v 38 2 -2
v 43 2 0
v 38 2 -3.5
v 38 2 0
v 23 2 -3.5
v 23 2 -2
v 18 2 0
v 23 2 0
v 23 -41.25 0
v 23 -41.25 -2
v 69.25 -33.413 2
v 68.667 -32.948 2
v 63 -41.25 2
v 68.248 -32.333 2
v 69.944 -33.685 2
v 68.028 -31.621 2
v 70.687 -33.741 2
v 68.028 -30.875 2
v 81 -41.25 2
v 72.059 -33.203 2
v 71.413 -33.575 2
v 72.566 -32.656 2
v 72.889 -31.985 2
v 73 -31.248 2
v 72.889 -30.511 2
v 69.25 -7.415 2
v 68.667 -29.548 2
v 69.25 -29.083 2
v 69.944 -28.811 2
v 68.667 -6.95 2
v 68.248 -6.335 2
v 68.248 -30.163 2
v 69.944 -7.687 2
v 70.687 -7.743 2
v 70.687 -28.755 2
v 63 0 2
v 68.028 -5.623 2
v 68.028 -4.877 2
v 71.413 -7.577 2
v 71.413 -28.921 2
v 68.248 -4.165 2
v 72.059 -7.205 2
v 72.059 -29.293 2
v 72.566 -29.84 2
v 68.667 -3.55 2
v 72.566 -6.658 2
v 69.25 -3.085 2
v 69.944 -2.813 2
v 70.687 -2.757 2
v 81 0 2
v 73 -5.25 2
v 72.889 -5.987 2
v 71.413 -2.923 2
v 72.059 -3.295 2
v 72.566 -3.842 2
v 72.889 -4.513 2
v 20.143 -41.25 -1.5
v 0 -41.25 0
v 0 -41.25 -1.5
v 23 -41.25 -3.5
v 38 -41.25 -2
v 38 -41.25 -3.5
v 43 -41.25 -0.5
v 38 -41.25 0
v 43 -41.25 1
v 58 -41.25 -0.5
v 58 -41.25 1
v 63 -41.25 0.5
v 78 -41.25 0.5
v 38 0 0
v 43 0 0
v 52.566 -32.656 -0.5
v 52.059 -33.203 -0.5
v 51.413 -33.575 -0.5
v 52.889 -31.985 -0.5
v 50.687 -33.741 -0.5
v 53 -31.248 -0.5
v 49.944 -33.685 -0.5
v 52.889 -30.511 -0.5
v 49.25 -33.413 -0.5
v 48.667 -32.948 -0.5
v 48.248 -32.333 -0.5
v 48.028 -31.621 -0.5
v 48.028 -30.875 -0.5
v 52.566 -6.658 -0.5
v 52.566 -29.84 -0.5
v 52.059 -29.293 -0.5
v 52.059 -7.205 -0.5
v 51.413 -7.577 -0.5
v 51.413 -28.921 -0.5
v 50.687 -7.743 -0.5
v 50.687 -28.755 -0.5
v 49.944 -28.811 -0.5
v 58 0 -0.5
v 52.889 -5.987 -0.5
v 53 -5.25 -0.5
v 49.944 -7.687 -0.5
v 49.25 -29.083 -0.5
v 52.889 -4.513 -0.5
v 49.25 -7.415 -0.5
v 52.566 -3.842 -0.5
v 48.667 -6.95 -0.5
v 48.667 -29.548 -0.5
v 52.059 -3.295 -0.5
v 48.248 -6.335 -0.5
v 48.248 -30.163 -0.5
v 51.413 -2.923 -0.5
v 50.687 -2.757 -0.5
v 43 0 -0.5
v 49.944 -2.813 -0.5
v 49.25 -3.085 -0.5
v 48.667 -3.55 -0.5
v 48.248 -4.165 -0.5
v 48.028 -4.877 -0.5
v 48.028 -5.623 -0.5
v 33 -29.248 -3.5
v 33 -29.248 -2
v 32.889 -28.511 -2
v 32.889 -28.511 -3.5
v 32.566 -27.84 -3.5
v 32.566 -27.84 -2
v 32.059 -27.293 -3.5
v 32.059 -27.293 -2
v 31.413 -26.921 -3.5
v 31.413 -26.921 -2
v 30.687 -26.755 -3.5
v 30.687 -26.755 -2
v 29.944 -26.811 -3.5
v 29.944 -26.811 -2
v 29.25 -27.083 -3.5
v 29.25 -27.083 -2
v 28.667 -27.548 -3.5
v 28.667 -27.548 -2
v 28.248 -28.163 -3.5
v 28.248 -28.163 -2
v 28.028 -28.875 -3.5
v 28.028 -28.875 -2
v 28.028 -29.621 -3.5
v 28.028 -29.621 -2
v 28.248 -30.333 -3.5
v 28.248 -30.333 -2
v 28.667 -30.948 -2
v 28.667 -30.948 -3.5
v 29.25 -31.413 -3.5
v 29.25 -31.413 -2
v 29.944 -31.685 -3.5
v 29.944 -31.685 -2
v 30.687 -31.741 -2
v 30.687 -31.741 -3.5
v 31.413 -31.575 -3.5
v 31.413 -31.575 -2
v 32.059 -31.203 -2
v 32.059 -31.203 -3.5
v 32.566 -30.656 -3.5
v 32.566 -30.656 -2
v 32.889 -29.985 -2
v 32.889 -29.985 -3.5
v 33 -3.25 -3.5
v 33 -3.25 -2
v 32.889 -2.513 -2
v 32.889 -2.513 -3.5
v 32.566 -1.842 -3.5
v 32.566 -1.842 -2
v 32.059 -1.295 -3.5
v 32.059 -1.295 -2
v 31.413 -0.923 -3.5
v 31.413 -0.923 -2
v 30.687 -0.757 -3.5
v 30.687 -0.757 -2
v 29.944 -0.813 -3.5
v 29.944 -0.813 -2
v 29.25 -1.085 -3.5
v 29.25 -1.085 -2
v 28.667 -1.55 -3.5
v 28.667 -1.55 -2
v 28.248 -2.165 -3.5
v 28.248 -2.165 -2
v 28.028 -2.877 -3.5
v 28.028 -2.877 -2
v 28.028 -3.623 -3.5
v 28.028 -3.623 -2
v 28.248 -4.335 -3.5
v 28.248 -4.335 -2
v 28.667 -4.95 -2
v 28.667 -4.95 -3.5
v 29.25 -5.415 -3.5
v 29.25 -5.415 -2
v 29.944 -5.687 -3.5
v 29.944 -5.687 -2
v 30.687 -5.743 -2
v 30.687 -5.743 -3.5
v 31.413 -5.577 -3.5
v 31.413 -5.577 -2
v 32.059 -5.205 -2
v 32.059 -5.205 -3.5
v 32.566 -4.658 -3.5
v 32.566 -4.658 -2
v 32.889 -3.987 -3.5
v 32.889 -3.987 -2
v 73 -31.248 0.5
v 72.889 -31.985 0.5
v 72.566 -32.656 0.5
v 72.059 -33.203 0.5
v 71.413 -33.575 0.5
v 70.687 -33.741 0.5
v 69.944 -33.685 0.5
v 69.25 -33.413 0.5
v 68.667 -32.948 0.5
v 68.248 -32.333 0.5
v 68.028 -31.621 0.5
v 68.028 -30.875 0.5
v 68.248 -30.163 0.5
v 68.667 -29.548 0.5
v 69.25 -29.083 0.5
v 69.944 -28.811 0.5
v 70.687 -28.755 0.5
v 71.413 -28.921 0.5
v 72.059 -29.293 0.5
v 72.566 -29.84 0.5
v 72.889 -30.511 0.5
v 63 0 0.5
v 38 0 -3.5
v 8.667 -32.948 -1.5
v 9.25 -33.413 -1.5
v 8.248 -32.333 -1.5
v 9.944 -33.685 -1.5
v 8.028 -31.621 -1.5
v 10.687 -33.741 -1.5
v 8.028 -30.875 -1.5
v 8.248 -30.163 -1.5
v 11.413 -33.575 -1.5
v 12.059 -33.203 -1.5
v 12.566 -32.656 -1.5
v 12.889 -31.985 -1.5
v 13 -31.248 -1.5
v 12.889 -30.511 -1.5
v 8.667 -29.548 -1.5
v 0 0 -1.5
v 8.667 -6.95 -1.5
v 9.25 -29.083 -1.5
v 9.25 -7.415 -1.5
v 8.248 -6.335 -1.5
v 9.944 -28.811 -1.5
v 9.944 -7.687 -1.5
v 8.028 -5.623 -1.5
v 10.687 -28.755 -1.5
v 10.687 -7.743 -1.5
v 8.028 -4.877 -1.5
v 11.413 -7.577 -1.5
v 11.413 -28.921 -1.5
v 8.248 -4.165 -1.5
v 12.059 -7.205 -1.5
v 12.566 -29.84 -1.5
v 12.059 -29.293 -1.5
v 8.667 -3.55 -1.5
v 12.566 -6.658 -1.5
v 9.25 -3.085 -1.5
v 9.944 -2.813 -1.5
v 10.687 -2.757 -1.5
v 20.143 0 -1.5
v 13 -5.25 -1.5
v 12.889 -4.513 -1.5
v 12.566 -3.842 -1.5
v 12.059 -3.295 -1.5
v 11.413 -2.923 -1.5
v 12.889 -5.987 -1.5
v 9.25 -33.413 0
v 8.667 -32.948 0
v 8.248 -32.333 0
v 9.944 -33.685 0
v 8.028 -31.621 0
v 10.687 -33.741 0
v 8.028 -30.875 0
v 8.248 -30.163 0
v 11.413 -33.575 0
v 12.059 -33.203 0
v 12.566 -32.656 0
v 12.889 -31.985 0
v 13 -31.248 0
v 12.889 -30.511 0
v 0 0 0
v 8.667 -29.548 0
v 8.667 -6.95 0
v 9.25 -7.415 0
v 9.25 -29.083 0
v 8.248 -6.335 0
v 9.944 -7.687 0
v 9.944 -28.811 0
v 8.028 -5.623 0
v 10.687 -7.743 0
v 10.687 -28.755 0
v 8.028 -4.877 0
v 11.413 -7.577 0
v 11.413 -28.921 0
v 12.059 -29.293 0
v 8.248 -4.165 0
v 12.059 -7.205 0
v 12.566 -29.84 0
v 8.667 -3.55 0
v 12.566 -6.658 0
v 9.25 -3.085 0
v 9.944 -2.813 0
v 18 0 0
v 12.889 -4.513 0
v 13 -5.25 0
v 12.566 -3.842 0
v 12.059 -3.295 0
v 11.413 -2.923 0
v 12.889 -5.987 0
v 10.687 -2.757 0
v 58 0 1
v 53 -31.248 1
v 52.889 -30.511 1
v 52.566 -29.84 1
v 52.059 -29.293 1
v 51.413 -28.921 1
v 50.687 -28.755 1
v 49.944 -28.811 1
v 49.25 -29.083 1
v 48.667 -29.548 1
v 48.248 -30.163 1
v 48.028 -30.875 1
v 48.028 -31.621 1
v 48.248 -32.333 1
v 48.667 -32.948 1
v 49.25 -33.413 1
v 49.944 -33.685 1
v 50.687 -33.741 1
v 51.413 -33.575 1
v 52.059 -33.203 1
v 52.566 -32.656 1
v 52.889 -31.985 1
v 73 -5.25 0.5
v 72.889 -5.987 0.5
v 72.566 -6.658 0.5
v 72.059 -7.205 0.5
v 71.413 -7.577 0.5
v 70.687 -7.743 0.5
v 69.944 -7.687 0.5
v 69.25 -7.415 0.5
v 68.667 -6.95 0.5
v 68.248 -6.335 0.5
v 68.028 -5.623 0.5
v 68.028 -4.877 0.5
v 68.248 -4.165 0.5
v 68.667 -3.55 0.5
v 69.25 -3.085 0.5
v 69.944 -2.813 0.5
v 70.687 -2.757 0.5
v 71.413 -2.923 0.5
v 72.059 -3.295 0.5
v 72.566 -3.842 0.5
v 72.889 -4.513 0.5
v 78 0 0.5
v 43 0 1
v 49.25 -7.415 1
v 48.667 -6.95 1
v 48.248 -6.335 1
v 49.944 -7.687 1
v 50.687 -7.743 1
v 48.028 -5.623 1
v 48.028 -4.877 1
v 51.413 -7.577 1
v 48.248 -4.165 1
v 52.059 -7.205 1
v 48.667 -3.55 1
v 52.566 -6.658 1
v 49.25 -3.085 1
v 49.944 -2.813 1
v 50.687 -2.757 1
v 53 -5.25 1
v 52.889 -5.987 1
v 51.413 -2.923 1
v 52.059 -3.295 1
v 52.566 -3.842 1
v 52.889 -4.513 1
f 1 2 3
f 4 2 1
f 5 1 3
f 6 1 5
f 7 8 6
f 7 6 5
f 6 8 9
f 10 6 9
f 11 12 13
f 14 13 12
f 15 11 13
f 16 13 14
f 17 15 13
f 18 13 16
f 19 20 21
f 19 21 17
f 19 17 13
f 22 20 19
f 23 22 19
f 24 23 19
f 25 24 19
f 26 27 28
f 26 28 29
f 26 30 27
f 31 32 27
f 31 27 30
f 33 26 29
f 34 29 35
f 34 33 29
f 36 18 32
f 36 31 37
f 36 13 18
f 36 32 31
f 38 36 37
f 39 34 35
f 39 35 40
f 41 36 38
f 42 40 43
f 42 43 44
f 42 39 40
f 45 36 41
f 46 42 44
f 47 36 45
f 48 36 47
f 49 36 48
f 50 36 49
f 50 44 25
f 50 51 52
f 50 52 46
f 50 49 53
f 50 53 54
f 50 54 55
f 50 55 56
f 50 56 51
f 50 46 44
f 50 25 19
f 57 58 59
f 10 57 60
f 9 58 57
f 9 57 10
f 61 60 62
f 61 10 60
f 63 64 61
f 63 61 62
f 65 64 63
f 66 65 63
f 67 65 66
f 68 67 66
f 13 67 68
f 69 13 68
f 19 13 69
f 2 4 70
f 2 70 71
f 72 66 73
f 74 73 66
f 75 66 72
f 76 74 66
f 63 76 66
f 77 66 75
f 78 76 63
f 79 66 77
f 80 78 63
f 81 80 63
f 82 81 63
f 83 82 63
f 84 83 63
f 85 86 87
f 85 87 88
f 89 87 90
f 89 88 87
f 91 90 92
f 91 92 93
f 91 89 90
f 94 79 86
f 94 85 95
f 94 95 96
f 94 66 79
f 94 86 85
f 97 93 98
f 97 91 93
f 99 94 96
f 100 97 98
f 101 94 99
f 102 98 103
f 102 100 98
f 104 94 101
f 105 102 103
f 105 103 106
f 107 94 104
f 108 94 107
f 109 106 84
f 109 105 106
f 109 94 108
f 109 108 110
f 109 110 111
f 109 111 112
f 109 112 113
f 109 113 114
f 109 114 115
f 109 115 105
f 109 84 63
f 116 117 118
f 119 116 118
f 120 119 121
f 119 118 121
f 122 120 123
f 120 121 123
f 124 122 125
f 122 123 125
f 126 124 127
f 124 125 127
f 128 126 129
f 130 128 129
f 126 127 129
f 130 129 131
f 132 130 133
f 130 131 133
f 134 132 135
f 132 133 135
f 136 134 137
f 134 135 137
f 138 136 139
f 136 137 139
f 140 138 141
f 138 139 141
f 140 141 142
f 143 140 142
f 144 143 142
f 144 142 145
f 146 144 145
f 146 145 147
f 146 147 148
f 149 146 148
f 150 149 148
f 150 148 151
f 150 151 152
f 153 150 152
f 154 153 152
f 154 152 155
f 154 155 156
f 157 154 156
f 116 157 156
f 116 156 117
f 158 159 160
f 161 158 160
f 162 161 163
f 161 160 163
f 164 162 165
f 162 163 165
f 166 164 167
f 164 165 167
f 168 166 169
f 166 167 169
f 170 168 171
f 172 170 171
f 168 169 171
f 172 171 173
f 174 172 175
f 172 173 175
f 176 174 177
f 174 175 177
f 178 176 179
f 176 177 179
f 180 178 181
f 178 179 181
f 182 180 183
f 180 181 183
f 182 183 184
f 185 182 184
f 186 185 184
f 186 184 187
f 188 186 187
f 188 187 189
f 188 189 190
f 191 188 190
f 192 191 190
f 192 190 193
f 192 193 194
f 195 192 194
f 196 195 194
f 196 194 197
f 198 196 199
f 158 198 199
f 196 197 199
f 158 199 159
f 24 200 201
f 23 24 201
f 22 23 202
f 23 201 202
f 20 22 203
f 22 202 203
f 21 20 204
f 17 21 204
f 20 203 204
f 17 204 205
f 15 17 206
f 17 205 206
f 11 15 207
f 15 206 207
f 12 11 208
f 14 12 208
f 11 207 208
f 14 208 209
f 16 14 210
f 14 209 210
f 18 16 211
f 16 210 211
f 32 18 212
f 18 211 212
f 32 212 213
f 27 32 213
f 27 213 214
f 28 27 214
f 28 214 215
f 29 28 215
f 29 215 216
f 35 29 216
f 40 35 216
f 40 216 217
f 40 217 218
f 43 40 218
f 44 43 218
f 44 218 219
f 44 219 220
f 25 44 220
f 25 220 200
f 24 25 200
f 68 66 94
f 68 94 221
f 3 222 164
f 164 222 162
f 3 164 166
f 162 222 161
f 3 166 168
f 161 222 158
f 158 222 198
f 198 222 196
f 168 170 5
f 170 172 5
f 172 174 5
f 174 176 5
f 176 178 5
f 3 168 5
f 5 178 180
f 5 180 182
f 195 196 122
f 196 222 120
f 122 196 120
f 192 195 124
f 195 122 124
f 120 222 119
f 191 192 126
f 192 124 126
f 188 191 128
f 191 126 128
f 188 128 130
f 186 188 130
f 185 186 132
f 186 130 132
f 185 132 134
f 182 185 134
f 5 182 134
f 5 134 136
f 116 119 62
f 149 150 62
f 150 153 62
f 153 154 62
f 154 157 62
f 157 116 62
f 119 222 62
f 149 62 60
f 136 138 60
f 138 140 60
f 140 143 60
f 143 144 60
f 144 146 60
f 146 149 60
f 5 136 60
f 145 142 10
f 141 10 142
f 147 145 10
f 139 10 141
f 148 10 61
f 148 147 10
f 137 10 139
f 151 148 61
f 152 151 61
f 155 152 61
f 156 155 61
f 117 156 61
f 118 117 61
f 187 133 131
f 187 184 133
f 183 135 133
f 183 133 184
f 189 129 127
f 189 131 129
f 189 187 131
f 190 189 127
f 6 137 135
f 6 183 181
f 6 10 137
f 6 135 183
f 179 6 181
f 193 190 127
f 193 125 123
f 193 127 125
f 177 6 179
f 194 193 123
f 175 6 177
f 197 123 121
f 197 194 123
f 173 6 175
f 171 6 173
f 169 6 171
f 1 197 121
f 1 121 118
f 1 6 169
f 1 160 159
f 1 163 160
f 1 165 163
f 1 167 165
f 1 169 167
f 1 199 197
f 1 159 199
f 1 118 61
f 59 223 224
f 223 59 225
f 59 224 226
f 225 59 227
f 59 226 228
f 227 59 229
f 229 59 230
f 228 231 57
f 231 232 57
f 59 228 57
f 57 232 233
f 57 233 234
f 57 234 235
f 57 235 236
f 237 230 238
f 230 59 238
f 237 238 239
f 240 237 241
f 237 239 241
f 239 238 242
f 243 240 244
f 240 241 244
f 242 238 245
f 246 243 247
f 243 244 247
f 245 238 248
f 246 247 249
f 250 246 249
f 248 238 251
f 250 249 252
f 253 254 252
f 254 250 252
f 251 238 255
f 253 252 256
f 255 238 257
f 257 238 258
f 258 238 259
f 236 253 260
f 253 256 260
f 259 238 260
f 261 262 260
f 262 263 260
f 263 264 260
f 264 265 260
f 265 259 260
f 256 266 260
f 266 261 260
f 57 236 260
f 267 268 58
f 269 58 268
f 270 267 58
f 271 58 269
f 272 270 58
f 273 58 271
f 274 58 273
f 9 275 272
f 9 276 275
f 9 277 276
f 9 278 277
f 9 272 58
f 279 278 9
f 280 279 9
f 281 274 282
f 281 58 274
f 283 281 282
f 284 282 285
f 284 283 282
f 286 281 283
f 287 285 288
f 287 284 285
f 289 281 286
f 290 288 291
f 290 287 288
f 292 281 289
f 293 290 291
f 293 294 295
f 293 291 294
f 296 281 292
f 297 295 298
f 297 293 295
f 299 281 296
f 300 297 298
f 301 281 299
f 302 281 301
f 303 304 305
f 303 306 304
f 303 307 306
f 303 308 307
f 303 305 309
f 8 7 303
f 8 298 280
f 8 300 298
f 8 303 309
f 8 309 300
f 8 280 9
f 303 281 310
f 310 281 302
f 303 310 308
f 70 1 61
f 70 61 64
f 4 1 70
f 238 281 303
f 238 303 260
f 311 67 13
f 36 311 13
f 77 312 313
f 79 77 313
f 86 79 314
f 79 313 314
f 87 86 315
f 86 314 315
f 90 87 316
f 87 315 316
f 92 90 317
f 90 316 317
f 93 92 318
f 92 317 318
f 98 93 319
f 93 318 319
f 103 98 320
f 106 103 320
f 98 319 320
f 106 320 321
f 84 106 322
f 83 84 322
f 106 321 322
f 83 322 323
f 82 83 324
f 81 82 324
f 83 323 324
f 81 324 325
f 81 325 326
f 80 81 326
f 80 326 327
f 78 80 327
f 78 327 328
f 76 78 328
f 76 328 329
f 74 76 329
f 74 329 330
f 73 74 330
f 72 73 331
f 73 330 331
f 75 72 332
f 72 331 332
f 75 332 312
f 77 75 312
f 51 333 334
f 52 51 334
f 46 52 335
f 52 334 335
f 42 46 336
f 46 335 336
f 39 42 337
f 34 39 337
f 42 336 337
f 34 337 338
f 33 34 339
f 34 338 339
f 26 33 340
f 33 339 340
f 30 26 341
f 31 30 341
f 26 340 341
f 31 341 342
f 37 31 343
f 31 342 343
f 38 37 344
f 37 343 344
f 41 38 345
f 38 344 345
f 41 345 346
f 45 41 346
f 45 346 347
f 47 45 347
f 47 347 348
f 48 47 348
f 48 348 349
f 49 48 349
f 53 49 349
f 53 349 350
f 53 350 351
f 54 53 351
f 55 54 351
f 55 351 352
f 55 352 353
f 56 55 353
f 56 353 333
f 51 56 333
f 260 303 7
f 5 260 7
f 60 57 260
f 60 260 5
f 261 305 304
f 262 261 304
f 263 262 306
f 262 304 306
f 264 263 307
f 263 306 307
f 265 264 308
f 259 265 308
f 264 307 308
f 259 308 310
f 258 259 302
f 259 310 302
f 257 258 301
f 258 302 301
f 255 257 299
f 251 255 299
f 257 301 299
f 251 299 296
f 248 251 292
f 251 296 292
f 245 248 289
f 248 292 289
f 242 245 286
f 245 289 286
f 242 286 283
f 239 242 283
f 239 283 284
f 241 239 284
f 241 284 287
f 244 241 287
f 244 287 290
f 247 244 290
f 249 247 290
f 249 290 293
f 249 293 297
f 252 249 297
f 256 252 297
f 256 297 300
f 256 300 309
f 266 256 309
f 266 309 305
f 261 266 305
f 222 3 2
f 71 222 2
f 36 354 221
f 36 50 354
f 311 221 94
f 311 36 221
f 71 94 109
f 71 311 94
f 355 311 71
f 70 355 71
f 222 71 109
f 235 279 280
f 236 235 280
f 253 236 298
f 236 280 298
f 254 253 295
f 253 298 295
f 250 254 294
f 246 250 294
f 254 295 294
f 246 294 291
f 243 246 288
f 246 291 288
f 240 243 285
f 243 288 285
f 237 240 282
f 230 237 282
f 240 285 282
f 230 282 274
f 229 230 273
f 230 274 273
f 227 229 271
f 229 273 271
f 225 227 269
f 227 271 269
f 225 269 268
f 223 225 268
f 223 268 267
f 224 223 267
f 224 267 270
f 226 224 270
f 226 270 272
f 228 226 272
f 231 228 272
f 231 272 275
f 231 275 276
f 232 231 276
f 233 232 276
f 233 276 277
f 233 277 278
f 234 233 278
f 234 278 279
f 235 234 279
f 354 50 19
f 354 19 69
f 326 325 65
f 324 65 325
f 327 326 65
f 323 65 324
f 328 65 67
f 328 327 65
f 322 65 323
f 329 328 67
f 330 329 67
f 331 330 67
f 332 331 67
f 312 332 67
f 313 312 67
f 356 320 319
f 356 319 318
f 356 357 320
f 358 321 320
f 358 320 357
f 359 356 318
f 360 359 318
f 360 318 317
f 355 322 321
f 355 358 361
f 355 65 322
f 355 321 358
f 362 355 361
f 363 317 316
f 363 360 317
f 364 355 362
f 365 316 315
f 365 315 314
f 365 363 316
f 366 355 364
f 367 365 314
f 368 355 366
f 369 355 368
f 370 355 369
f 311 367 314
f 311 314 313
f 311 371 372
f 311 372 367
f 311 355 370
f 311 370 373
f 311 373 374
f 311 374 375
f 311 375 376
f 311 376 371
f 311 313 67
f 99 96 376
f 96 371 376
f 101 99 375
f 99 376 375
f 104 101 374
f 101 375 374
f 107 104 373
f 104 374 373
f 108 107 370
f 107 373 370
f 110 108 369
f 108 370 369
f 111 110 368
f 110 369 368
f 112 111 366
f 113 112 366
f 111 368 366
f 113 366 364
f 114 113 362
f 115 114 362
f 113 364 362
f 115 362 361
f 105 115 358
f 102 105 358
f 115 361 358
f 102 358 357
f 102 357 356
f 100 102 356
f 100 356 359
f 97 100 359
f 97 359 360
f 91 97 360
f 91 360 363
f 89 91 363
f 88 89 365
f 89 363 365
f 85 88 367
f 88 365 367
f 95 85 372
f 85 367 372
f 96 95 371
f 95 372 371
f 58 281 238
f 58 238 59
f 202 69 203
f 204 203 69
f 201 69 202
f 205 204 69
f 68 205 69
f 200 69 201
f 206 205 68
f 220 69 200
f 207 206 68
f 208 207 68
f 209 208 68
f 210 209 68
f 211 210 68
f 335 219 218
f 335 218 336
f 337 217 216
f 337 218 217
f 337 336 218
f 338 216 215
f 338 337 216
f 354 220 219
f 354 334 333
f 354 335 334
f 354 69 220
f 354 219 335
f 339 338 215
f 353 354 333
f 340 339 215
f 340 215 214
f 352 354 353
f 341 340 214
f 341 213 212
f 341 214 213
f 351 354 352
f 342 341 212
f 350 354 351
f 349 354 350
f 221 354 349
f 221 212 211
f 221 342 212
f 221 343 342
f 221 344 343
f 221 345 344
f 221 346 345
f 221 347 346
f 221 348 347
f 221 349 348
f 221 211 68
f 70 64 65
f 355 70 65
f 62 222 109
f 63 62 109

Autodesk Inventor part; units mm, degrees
ref_plane "YZ Plane" through (0, 0, 0) normal (1, 0, 0) x (0, 1, 0)
ref_plane "XZ Plane" through (0, 0, 0) normal (0, 1, 0) x (-1, 0, 0)
ref_plane "XY Plane" through (0, 0, 0) normal (0, 0, 1) x (1, 0, 0)
sketch "Sketch1" plane through (0, 0, 0) normal (0, 0, 1) x (1, 0, 0)
  line L0 (0, 0) -> (81, 0)
  line L1 (0, 0) -> (0, -41.25)
  line L2 (0, -41.25) -> (81, -41.25)
  line L3 (81, -41.25) -> (81, 0)
  line L4 (23, 0) -> (23, 2)
  line L5 (23, 2) -> (38, 2)
  line L6 (38, 2) -> (38, 0)
  line L7 (3, 0) -> (3, -41.25)
  line L8 (18, 0) -> (18, -41.25)
  line L9 (23, 0) -> (23, -41.25)
  line L10 (38, 0) -> (38, -41.25)
  line L11 (43, 0) -> (43, -41.25)
  line L12 (58, 0) -> (58, -41.25)
  line L13 (63, 0) -> (63, -41.25)
  line L14 (78, 0) -> (78, -41.25)
  line L15 (0, 0) -> (3, 0)
  line L16 (3, 0) -> (3, -41.25)
  line L17 (3, -41.25) -> (0, -41.25)
  line L18 (0, -41.25) -> (0, 0)
  line L19 (78, 0) -> (81, 0)
  line L20 (81, 0) -> (81, -41.25)
  line L21 (81, -41.25) -> (78, -41.25)
  line L22 (78, -41.25) -> (78, 0)
  circle A0 centre (10.5, -5.25) radius 2.5
  circle A1 centre (10.5, -31.248) radius 2.5
  circle A2 centre (30.5, -3.25) radius 2.5
  circle A3 centre (30.5, -29.248) radius 2.5
  circle A4 centre (50.5, -5.25) radius 2.5
  circle A5 centre (50.5, -31.248) radius 2.5
  circle A6 centre (70.5, -5.25) radius 2.5
  circle A7 centre (70.5, -31.248) radius 2.5
  point P0 (10.5, -41.25)
  point P1 (50.5, 0)
  point P2 (70.5, 0)
  point P3 (30.5, 0)
  dimension "d0" = 81
  dimension "d2" = 41.25
  dimension "d3" = 2
  dimension "d24" = 5
  dimension "d25" = 5
  dimension "d26" = 5
  dimension "d27" = 5
  dimension "d28" = 5
  dimension "d29" = 5
  dimension "d30" = 5
  dimension "d31" = 5
sketch "Sketch3" plane through (0, 0, 0) normal (0, 1, 0) x (-1, 0, 0)
  line L0 (0, 0) -> (-81, 0) projected
  line L1 (-23, 0) -> (-38, 0) projected
  line L2 (0, 0) -> (-81, 0) projected
  line L3 (-23, 0) -> (-23, -2)
  line L4 (-23, -2) -> (-38, -2)
  line L5 (-38, -2) -> (-38, 0)
  line L6 (-43, 0) -> (-43, 1)
  line L7 (-43, 1) -> (-58, 1)
  line L8 (-58, 1) -> (-58, 0)
  line L9 (-63, 0) -> (-63, 2)
  line L10 (-63, 2) -> (-78, 2)
  line L11 (-78, 2) -> (-78, 0)
  line L12 (-23, -2) -> (-38, -2)
  line L13 (-38, -2) -> (-38, -3.5)
  line L14 (-38, -3.5) -> (-23, -3.5)
  line L15 (-23, -3.5) -> (-23, -2)
  line L16 (-18, 0) -> (-23, -3.5)
  line L17 (-38, -3.5) -> (-43, 0)
  line L18 (-43, 1) -> (-58, 1)
  line L19 (-58, 1) -> (-58, -0.5)
  line L20 (-58, -0.5) -> (-43, -0.5)
  line L21 (-43, -0.5) -> (-43, 1)
  line L22 (-38, 0) -> (-43, 1)
  line L23 (-63, 2) -> (-78, 2)
  line L24 (-78, 2) -> (-78, 0.5)
  line L25 (-78, 0.5) -> (-63, 0.5)
  line L26 (-63, 0.5) -> (-63, 2)
  line L27 (-58, 1) -> (-63, 2)
  line L28 (-58, -0.5) -> (-63, 0.5)
  line L29 (-78, 2) -> (-81, 2)
  line L30 (-81, 2) -> (-78, 0.5)
  line L31 (-43, 1) -> (-38, 0)
  line L32 (-43, 0) -> (-43, 1)
  line L33 (-43, 0) -> (-38, 0)
  line L34 (-38, 0) -> (-43, 1)
  line L35 (-43, 1) -> (-43, 0)
  line L36 (-38, -3.5) -> (-43, -0.5)
  line L37 (-43, -0.5) -> (-58, -0.5)
  line L38 (-58, 1) -> (-58, -0.5)
  line L39 (-58, 1) -> (-43, 1)
  line L40 (-58, -0.5) -> (-58, 1)
  line L41 (-58, 1) -> (-63, 2)
  line L42 (-63, 2) -> (-63, 0.5)
  line L43 (-63, 0.5) -> (-58, -0.5)
  line L44 (-58, -0.5) -> (-60.5, 0)
  line L45 (-58, -0.5) -> (-58, 0)
  line L46 (-58, 0) -> (-60.5, 0)
  line L47 (-60.5, 0) -> (-63, 0.5)
  line L48 (-63, 0.5) -> (-63, 2)
  line L49 (-63, 2) -> (-58, 1)
  line L50 (-58, 1) -> (-58, -0.5)
  point P0 (-3, 0)
  dimension "d4" = 2
  dimension "d5" = 1
  dimension "d6" = 2
  dimension "d7" = 15
  dimension "d8" = 90
  dimension "d11" = 1.5
  dimension "d16" = 15
  dimension "d17" = 1.5
extrude "Extrusion1" add sketch "Sketch1" against normal blind 1.5 contours L0 L7 L2 L1 | L0 L8 L2 L7 | L0 L9 L2 L8 | A0 | A1
extrude "Extrusion2" add sketch "Sketch3" against normal blind 41.25 contours L16 L15 L3 L0 | L14 L13 L4 L15 | L5 L13 L17 L0
extrude "Extrusion3" add sketch "Sketch3" along normal blind 2 contours L16 L15 L3 L0 | L14 L13 L4 L15 | L5 L13 L17 L0
extrude "Extrusion4" add sketch "Sketch3" against normal blind 41.25 contours L0 L6 L22 | L36 L21 L17 | L21 L20 L19 L0 | L0 L8 L7 L6 | L9 L25 L11 L10 | L11 L30 L29
extrude "Extrusion5" add sketch "Sketch3" against normal blind 41.25 contours L19 L28 L0 | L0 L28 L9 L27 L8
extrude "Extrusion6" cut sketch "Sketch1" along normal through all both and the other way through all contours A0 | A1 | A2 | A3 | A4 | A5 | A6 | A7
properties part number "Finger_Support_base_Screwing"
